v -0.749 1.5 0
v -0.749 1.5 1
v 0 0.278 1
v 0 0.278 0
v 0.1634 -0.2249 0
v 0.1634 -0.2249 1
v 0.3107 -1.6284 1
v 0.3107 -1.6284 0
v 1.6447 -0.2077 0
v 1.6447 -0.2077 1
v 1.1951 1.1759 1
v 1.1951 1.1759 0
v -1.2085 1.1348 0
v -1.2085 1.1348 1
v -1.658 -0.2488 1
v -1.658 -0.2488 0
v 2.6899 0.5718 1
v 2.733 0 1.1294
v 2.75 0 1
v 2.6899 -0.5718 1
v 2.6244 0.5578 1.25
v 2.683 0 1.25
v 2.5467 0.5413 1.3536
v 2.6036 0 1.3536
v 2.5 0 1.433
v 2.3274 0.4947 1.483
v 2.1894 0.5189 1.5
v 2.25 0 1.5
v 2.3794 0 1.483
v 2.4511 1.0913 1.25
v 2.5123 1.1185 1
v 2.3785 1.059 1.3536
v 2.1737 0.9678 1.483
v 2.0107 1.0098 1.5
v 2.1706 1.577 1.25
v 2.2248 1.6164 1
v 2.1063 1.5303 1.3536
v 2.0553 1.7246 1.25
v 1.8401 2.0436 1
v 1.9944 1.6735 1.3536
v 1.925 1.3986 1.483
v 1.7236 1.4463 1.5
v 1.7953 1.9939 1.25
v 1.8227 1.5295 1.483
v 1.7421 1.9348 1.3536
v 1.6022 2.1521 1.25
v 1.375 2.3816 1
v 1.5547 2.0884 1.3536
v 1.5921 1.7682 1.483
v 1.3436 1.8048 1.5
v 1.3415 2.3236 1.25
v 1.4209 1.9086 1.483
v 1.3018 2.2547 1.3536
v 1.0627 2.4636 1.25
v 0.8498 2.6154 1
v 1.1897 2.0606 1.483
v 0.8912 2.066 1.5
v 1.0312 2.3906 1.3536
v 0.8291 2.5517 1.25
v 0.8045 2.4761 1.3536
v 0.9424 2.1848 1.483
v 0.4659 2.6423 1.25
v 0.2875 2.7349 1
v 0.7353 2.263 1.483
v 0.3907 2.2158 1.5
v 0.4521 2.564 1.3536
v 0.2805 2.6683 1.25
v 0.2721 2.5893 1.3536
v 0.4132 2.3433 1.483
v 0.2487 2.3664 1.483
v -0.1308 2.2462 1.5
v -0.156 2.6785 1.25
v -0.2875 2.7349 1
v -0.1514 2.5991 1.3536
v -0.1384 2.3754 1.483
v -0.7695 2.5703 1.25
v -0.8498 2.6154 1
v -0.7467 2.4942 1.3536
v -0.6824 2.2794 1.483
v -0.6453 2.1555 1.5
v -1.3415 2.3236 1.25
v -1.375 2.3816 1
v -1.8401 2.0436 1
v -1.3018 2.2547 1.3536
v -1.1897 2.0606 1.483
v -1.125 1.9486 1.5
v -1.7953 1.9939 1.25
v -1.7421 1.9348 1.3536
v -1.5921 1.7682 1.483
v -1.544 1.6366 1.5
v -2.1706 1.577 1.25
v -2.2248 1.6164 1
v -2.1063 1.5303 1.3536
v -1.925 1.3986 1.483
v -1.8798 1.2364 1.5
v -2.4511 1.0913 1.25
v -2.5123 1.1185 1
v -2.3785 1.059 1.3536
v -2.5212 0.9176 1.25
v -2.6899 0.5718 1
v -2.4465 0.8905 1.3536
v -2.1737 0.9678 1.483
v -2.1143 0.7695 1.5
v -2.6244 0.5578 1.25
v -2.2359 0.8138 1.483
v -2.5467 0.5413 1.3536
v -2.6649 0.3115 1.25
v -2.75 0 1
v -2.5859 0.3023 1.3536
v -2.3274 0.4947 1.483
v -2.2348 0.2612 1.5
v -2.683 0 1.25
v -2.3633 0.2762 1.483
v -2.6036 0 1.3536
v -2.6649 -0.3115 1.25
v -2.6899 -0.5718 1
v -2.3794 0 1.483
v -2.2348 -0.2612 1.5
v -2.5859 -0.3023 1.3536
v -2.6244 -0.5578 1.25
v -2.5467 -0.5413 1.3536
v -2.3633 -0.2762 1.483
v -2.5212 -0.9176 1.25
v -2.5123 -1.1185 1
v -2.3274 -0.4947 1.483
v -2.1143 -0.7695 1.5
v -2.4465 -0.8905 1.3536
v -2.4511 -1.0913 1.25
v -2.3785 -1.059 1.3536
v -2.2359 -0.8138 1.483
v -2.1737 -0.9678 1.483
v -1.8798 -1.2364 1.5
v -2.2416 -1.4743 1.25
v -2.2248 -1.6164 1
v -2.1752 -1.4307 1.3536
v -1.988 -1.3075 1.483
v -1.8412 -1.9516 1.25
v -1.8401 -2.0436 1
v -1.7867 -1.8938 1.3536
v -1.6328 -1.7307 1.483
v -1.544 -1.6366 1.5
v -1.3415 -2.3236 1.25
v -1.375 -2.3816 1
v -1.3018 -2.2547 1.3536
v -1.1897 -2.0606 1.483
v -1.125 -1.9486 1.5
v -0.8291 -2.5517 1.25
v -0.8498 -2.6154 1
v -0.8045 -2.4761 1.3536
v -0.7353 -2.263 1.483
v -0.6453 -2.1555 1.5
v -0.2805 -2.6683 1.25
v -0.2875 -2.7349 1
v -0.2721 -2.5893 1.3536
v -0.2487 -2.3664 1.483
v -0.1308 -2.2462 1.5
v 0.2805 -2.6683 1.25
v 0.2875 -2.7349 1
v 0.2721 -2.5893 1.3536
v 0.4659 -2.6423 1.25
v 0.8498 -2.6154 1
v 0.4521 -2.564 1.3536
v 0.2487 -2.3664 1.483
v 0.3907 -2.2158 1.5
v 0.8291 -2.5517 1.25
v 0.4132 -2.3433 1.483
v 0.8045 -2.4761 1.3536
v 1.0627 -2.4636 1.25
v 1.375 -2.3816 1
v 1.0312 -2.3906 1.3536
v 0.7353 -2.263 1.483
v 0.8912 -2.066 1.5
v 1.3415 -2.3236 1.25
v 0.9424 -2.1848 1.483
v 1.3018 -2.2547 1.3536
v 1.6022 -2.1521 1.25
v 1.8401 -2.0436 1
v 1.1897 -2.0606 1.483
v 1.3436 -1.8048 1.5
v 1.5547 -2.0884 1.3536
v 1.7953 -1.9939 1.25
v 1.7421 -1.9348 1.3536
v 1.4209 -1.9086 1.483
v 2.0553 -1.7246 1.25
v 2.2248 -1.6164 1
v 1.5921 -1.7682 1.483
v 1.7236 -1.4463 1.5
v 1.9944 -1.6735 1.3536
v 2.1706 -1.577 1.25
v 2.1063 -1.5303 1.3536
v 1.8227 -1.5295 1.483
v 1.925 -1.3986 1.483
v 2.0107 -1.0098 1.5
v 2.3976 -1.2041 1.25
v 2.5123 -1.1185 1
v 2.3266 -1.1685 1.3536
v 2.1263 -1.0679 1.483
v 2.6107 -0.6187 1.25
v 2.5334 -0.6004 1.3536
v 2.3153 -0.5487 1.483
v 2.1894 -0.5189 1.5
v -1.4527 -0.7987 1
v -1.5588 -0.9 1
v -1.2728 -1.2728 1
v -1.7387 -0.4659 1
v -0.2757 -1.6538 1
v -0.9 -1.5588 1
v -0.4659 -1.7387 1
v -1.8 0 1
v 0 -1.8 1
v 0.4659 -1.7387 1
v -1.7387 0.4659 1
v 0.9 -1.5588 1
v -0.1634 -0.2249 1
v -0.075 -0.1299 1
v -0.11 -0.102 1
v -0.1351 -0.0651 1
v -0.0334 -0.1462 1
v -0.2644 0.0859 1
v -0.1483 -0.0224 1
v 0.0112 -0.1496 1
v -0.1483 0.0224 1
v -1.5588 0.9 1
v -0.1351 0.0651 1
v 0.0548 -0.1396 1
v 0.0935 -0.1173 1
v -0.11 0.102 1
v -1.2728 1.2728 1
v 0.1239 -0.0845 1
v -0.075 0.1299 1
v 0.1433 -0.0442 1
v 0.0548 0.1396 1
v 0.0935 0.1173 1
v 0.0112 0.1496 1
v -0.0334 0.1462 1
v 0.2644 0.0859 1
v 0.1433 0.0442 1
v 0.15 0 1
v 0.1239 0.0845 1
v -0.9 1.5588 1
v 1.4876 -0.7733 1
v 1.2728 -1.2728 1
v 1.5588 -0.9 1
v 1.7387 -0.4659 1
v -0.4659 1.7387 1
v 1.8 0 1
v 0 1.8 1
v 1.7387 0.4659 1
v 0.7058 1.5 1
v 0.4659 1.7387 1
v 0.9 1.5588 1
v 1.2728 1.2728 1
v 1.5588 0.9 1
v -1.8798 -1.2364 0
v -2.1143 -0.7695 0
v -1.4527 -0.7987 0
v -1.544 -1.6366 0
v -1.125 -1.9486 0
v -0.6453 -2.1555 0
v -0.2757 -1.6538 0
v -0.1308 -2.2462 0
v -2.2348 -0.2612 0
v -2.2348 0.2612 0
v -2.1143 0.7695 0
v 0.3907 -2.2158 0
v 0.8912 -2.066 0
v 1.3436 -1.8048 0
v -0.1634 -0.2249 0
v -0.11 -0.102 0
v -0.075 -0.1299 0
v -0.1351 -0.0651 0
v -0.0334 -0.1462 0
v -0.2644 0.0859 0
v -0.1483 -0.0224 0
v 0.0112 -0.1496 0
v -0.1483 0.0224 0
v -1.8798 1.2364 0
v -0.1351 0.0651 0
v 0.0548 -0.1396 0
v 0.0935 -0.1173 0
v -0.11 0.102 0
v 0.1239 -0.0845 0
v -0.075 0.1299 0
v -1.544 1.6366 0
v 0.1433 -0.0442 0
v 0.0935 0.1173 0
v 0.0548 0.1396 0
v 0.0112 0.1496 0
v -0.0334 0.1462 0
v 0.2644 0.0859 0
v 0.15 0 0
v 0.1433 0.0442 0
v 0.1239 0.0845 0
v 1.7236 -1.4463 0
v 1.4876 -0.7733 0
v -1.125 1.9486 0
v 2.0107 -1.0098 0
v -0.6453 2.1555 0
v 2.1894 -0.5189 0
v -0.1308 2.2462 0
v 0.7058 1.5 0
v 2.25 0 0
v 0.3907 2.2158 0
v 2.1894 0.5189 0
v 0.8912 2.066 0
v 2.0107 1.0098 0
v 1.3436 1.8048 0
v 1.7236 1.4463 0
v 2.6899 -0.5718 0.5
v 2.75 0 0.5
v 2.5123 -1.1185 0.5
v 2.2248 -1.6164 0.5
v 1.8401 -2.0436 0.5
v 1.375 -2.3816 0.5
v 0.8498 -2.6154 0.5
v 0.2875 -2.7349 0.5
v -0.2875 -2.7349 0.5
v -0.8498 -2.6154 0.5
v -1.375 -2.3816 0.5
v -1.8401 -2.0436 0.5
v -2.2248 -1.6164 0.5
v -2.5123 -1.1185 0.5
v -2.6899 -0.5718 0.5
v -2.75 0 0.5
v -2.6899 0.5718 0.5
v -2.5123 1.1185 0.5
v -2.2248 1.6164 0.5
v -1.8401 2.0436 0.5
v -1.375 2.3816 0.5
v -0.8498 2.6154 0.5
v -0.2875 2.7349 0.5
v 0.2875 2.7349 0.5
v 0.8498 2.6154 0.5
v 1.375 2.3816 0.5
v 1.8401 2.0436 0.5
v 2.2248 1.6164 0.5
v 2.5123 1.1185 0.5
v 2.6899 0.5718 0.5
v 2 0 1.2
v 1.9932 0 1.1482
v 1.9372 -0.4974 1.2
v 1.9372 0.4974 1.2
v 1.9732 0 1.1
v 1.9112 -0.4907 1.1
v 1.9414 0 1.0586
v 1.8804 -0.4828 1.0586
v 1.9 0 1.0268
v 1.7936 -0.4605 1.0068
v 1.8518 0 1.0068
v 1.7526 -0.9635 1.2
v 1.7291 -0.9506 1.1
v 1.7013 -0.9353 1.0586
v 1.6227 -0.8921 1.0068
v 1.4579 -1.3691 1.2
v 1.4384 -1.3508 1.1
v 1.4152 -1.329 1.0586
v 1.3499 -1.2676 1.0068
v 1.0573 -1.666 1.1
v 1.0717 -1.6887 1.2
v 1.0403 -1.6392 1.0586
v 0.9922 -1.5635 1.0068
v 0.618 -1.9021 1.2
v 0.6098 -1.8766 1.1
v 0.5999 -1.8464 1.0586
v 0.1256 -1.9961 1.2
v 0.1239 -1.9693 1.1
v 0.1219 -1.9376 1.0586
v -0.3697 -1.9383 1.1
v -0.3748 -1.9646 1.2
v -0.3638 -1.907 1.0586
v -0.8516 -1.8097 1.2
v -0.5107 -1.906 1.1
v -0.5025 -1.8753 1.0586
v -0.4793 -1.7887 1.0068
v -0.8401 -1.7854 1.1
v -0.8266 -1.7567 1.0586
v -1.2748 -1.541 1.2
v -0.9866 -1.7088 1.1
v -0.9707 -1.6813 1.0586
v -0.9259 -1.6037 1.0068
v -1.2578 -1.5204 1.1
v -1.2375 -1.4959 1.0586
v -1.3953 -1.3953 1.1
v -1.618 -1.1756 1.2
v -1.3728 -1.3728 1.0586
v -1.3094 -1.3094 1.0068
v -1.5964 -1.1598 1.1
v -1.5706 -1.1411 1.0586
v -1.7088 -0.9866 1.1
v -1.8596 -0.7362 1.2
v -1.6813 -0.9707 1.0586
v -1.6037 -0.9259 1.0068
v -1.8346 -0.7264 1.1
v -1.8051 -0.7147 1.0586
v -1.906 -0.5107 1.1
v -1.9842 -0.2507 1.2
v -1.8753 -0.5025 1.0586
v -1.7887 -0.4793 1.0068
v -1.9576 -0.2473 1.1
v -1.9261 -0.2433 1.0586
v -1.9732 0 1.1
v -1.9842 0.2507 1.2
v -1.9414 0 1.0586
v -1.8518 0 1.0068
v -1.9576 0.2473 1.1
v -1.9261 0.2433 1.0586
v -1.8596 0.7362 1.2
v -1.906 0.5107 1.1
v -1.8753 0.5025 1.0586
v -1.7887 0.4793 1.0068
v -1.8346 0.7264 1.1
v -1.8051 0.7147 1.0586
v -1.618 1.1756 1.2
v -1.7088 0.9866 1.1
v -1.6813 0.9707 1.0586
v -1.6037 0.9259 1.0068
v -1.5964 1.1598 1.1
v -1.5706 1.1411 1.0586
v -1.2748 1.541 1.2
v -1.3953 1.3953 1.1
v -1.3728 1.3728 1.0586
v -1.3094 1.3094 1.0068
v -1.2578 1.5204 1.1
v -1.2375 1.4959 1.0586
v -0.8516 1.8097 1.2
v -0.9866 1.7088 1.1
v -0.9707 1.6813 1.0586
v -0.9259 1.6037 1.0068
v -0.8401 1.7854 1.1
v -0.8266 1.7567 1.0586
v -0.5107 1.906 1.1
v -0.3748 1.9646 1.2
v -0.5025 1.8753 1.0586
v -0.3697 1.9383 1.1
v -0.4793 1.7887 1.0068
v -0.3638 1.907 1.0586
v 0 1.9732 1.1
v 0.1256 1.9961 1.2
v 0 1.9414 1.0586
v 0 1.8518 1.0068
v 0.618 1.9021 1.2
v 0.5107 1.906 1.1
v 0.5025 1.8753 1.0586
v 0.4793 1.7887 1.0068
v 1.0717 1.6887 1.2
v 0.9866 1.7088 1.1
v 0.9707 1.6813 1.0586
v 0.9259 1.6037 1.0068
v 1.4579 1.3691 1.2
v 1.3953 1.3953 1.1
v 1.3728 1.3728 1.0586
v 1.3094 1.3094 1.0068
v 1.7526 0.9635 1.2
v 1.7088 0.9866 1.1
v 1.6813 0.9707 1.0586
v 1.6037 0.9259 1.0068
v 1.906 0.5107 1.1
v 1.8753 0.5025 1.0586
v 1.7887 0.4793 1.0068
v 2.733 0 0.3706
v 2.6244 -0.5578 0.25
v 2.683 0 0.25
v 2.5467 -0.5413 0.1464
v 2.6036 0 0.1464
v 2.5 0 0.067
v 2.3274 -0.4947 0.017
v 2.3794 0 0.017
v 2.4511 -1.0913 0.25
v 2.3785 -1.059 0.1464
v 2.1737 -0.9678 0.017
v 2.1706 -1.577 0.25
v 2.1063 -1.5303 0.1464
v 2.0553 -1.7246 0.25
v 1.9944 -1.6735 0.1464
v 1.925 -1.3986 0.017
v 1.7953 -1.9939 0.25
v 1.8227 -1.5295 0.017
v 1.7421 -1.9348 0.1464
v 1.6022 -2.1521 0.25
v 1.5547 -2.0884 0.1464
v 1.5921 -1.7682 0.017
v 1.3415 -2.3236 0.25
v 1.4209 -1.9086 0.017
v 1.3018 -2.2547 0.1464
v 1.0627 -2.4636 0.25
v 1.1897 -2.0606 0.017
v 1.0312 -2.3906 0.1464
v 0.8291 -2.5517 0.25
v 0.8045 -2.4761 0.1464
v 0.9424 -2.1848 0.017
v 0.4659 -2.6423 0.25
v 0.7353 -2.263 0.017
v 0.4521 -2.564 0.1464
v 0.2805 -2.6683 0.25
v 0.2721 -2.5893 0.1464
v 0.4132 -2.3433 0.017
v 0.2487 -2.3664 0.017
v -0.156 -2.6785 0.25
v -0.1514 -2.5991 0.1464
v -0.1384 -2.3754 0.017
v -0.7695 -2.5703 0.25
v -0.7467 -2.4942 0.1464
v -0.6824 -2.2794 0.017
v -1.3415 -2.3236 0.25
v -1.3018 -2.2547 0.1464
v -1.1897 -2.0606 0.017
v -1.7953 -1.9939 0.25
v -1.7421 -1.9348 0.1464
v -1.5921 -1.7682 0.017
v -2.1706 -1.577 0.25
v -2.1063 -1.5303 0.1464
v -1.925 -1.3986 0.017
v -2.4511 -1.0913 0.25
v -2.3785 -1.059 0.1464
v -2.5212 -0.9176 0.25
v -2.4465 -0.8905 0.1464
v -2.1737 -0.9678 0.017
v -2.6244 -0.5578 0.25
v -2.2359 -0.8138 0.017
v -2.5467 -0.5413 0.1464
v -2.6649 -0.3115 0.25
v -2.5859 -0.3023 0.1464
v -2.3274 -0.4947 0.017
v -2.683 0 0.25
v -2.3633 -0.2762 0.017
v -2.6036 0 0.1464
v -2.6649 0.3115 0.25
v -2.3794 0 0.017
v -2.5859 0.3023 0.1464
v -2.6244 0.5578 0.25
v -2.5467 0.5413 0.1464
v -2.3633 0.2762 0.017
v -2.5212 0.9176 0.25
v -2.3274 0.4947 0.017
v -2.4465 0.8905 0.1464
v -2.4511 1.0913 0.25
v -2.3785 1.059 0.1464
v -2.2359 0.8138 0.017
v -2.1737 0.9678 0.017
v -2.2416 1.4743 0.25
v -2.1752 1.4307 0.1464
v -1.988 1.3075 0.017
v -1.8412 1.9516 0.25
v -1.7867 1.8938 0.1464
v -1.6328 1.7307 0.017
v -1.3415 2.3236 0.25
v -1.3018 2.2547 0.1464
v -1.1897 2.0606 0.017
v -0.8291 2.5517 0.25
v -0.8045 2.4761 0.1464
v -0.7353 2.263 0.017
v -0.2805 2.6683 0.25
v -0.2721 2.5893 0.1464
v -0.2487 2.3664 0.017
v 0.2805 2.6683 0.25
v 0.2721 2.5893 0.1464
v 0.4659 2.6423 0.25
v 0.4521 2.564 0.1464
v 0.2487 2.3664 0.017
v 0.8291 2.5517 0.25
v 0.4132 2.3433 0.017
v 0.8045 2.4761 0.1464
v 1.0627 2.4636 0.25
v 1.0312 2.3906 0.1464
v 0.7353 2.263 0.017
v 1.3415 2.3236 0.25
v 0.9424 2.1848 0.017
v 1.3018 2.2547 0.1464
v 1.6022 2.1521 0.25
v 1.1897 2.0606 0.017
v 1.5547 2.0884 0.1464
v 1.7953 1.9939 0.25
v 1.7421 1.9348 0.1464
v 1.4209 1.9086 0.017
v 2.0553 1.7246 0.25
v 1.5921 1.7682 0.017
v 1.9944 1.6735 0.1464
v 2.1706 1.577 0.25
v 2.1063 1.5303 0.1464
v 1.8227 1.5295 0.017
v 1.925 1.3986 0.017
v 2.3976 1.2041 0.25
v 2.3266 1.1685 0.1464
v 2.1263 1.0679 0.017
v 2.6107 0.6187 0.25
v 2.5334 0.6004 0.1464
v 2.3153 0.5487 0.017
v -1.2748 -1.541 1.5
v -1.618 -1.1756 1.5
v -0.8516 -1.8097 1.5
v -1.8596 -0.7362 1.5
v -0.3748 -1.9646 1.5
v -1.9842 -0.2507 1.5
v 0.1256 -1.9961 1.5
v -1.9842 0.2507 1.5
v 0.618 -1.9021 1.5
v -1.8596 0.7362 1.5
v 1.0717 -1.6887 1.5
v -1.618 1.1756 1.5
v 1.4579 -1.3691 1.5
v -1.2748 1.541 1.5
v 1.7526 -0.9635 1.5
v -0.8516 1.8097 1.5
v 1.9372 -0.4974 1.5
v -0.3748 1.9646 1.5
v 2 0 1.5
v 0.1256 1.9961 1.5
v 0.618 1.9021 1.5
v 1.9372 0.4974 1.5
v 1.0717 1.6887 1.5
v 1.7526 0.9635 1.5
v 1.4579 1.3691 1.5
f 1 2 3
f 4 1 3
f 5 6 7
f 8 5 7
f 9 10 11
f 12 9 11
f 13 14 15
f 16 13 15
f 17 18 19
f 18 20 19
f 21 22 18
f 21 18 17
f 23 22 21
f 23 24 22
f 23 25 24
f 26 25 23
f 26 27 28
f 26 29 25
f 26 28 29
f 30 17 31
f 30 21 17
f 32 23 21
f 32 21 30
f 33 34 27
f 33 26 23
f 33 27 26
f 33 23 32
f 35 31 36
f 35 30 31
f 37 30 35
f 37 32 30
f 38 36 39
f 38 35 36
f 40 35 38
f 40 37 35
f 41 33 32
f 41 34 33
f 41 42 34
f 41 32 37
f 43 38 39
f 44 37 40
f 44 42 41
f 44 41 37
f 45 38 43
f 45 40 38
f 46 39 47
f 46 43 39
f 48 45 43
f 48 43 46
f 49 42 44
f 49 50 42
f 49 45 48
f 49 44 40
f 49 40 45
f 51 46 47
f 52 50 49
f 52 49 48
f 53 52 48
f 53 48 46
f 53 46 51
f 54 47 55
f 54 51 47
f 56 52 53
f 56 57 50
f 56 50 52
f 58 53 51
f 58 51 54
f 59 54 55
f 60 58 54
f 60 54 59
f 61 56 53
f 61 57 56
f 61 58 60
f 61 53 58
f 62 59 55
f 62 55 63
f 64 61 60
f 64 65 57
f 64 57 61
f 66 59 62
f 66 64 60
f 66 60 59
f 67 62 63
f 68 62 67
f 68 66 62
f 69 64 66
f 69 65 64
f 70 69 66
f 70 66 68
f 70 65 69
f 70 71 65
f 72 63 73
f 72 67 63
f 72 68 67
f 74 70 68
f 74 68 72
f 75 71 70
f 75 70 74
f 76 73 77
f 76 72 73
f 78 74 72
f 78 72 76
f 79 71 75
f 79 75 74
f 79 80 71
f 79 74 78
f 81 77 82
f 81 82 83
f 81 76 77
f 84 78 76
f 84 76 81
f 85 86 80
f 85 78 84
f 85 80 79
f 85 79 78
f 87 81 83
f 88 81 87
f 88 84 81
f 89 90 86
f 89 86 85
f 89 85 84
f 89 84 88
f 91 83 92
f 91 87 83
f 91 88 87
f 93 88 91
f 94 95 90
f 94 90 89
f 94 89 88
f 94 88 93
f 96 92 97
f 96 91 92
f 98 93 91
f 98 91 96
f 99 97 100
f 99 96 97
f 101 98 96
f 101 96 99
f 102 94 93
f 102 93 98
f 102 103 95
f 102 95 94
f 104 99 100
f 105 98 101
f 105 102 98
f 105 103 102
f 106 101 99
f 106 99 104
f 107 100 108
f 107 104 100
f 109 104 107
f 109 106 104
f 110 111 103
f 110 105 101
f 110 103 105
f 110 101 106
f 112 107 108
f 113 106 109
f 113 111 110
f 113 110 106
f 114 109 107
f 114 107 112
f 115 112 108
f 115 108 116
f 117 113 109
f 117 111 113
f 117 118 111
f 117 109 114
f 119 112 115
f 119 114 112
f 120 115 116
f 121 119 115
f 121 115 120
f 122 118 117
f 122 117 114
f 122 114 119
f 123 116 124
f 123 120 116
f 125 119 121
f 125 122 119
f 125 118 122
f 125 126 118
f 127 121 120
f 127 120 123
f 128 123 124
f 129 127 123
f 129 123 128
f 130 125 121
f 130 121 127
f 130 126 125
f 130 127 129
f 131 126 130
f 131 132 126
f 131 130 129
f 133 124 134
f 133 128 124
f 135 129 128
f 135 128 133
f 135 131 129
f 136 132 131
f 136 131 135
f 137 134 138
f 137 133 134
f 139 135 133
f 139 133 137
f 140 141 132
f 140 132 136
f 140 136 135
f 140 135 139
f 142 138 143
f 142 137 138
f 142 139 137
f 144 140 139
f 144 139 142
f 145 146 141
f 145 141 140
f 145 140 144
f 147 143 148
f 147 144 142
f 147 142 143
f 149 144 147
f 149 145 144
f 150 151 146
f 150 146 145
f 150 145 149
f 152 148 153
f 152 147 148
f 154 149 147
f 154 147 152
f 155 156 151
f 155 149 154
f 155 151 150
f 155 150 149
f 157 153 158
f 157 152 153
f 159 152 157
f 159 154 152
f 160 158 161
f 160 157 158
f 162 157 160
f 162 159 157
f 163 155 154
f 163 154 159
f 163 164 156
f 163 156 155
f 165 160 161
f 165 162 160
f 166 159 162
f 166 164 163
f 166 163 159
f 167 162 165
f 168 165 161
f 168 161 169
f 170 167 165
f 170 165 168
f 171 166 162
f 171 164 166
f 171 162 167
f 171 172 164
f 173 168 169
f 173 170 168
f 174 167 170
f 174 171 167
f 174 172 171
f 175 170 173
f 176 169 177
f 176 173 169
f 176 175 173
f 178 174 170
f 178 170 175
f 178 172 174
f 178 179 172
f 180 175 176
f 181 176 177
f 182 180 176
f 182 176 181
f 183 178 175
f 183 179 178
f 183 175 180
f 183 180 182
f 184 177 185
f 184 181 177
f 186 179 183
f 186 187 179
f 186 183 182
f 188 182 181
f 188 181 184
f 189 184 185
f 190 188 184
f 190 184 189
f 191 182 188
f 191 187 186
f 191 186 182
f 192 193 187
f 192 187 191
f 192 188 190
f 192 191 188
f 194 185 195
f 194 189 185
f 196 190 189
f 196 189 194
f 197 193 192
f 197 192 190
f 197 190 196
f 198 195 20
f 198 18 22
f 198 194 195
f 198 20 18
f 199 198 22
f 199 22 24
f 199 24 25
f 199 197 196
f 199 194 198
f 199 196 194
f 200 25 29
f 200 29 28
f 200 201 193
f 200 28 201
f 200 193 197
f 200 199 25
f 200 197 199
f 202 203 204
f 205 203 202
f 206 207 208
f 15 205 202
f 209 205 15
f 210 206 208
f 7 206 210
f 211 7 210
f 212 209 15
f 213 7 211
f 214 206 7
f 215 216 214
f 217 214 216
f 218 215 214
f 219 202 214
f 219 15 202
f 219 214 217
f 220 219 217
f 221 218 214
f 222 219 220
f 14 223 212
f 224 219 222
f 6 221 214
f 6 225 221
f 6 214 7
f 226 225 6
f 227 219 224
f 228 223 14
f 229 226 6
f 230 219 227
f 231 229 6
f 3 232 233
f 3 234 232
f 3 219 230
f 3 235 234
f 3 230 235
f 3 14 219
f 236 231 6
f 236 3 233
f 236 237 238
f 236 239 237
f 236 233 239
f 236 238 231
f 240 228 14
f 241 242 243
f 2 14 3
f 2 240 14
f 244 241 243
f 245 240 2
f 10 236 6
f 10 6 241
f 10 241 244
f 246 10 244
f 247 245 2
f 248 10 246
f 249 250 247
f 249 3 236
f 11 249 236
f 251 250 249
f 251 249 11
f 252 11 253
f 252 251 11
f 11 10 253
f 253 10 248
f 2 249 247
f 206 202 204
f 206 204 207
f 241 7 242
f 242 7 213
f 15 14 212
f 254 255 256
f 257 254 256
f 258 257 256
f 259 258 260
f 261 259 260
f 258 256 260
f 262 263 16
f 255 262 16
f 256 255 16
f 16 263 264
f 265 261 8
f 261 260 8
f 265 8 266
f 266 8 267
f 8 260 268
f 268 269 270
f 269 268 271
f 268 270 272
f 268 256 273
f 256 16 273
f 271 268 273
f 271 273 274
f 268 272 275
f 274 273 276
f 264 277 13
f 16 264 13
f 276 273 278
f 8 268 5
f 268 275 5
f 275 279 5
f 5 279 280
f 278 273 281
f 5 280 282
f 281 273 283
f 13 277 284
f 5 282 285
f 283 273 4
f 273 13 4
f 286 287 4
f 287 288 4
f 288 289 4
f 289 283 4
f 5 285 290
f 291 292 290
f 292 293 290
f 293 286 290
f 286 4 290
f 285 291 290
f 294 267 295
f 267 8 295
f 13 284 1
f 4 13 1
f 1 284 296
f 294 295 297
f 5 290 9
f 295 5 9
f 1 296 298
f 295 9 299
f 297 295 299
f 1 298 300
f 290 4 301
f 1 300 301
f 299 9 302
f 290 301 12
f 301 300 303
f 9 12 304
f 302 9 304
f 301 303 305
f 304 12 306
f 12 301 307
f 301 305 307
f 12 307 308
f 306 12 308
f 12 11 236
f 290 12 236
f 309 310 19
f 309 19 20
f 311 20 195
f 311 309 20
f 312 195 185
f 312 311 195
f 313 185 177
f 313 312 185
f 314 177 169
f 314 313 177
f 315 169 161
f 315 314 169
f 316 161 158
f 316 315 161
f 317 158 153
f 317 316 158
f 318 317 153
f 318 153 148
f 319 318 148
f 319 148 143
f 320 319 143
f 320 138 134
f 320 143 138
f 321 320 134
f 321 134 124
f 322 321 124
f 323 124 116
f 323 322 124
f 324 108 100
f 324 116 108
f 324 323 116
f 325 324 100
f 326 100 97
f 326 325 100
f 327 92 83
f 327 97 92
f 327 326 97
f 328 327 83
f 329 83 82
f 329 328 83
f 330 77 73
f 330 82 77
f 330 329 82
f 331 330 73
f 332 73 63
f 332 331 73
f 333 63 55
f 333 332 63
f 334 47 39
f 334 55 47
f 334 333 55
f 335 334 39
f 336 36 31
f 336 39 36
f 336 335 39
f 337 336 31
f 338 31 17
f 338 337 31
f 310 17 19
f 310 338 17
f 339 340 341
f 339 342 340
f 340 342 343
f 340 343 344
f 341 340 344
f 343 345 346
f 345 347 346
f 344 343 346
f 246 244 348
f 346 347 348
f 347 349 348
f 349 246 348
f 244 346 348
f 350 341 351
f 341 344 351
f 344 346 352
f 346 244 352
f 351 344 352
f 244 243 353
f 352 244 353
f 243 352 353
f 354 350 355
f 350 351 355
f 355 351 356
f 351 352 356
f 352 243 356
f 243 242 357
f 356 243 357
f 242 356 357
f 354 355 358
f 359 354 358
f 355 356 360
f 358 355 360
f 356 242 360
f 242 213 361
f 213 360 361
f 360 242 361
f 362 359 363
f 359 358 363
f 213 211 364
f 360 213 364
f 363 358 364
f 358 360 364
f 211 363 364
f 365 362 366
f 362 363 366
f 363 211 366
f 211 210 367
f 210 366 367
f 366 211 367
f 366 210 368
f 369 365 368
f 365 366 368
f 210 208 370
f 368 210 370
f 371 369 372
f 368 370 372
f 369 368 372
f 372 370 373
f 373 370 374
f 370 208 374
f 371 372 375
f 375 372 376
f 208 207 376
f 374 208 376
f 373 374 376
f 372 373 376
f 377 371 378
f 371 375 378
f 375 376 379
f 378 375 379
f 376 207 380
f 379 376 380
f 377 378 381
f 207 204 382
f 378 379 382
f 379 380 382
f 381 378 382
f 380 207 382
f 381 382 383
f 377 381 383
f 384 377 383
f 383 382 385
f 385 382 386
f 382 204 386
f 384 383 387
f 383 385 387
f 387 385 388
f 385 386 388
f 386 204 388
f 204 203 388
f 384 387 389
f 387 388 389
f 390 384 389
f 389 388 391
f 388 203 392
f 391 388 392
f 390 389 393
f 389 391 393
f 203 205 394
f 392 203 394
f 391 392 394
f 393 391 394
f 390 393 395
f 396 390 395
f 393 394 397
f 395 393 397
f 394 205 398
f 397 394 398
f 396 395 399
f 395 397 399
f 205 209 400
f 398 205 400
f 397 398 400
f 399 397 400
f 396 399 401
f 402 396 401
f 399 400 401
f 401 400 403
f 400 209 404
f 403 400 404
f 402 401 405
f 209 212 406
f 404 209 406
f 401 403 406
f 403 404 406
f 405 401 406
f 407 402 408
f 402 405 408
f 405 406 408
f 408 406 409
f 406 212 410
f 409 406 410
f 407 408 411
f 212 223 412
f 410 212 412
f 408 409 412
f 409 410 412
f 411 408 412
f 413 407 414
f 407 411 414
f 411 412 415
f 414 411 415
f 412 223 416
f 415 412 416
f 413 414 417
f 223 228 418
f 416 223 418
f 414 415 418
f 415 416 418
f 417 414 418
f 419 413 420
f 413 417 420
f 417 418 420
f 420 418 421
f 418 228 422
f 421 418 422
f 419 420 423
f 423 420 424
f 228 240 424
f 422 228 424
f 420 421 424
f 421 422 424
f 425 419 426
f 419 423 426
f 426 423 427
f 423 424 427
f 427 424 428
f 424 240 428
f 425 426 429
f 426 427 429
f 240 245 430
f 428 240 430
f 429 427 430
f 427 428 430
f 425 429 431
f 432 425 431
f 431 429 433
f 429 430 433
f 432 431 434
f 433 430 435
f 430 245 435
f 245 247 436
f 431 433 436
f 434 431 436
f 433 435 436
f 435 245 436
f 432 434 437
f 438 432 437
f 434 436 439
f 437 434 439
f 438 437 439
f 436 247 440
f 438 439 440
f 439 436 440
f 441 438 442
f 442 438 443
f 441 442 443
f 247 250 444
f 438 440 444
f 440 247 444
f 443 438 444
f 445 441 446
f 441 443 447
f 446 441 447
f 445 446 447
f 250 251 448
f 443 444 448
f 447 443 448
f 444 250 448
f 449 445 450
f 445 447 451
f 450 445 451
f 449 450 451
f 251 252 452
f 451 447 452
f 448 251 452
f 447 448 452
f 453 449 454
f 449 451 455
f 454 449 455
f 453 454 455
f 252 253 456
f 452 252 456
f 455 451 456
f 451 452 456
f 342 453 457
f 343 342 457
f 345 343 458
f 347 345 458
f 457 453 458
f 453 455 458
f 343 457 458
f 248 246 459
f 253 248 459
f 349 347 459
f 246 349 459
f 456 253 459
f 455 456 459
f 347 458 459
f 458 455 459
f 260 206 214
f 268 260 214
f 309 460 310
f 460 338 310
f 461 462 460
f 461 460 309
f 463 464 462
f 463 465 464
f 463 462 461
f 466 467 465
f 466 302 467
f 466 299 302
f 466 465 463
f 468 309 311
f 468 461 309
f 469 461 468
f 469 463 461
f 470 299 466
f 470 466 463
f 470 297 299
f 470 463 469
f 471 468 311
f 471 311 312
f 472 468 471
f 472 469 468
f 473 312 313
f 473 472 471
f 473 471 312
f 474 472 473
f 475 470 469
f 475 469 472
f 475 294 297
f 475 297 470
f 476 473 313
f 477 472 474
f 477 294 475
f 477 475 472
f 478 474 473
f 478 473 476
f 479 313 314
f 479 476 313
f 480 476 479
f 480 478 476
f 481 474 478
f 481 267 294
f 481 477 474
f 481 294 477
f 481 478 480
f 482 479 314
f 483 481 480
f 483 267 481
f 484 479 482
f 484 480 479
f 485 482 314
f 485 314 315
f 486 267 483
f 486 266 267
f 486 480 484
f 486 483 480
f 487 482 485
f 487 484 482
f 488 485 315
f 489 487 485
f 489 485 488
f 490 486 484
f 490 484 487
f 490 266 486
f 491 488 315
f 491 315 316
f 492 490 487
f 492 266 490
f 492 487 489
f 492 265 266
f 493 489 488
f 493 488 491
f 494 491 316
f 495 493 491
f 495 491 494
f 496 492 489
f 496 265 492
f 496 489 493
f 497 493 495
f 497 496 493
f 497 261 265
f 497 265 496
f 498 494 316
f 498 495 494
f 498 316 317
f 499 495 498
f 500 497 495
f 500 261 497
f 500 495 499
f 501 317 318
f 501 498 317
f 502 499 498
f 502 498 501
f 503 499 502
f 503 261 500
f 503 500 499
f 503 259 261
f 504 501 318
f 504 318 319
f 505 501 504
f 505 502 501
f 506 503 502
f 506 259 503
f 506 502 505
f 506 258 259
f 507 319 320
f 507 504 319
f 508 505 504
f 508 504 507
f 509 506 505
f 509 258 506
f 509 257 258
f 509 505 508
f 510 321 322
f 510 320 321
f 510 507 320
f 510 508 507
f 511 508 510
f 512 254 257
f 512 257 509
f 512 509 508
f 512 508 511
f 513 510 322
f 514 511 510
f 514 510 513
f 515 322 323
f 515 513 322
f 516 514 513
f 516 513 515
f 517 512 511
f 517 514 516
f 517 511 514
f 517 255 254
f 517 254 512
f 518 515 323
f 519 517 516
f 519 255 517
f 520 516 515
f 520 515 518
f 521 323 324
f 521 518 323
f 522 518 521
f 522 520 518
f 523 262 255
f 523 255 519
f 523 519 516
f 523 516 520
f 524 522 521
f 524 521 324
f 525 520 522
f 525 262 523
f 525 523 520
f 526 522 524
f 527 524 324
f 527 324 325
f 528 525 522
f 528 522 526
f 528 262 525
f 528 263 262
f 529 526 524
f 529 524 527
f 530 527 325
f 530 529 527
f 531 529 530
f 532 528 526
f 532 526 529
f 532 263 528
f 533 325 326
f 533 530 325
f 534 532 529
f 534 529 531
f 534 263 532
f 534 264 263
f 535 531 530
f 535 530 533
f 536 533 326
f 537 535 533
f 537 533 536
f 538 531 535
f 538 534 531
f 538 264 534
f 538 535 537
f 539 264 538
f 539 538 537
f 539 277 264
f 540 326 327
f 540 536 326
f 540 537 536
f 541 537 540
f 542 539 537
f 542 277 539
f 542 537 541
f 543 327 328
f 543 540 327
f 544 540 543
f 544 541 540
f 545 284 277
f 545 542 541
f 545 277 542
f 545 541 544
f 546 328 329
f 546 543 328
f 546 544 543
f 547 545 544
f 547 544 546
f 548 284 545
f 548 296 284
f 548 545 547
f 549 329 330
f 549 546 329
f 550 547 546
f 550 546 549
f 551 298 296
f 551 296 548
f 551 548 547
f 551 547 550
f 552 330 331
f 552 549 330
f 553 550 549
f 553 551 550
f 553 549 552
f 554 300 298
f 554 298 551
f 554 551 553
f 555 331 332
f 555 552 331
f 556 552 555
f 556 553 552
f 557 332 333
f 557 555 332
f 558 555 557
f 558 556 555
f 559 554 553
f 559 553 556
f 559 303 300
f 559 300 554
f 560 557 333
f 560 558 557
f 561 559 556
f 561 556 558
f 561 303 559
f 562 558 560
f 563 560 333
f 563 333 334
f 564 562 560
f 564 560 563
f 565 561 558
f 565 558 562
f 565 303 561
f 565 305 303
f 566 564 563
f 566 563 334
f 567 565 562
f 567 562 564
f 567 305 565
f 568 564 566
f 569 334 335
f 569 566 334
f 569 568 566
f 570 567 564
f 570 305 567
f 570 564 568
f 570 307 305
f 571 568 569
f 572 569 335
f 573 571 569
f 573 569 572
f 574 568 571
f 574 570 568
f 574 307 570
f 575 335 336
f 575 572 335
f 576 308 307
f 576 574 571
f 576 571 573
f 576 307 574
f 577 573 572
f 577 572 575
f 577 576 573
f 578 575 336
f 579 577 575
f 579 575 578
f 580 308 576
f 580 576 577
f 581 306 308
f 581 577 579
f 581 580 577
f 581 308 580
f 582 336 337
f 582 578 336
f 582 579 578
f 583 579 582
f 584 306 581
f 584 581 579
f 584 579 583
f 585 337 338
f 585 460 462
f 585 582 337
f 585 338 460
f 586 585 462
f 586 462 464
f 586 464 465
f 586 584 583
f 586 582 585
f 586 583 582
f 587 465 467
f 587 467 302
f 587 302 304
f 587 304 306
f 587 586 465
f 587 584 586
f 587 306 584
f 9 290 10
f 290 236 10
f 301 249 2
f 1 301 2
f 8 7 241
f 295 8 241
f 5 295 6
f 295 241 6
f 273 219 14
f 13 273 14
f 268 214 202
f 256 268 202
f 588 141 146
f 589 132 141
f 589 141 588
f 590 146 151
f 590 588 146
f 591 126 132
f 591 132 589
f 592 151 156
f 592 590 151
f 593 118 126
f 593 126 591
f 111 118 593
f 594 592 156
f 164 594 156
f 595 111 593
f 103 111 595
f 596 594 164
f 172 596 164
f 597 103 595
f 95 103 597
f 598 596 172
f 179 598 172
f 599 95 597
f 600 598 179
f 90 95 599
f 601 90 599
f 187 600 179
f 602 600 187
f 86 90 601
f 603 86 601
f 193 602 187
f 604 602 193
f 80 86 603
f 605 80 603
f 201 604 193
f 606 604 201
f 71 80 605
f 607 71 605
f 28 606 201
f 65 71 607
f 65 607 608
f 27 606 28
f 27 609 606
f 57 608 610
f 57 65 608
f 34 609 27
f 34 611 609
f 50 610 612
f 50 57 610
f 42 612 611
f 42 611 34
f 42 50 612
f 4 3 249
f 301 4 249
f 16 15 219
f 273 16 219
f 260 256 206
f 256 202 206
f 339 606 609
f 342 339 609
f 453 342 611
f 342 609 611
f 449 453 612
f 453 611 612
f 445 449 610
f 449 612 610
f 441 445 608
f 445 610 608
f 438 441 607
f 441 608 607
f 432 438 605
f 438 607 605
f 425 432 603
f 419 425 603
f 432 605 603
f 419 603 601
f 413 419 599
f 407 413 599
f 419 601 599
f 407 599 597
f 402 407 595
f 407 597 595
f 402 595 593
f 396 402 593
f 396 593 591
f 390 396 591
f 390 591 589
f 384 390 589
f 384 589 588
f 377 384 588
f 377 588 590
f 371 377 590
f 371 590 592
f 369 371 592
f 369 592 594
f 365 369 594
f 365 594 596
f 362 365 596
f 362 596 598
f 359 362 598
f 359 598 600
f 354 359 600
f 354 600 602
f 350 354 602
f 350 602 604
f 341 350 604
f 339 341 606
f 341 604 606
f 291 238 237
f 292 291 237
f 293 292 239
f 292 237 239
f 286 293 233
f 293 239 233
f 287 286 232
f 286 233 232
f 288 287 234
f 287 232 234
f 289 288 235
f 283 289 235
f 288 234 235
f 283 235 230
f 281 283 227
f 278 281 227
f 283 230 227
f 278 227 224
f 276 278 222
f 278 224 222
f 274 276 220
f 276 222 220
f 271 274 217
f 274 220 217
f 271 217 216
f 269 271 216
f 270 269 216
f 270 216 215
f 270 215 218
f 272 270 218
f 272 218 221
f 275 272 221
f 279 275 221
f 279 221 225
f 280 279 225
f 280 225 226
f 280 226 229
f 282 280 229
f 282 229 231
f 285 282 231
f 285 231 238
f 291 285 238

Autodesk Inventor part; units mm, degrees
ref_plane "YZ Plane" through (0, 0, 0) normal (1, 0, 0) x (0, 1, 0)
ref_plane "XZ Plane" through (0, 0, 0) normal (0, 1, 0) x (-1, 0, 0)
ref_plane "XY Plane" through (0, 0, 0) normal (0, 0, 1) x (1, 0, 0)
sketch "Sketch1" plane through (0, 0, 0) normal (0, 0, 1) x (1, 0, 0)
  circle A0 centre (0, 0) radius 2.75
  circle A1 centre (0, 0) radius 2
  dimension "d0" = 5.5
  dimension "d1" = 4
extrude "Extrusion1" add sketch "Sketch1" along normal blind 1.5 contours A0 | A1
sketch "Sketch2" plane through (0, 0, 1.5) normal (0, 0, 1) x (1, 0, 0)
  circle A0 centre (0, 0) radius 2
  dimension "d4" = 4
extrude "Extrusion2" cut sketch "Sketch2" against normal blind 0.5
fillet "Fillet1" radius 0.5 2 edges at (-2.75, 0, 1.5) (-2.75, 0, 0)
fillet "Fillet2" radius 0.2 1 edges at (-2, 0, 1)
sketch "Sketch3" plane through (0, 0, 1) normal (0, 0, 1) x (1, 0, 0)
  point P0 (0, 0)
sketch "Sketch4" plane through (0, 0, 1) normal (0, 0, 1) x (1, 0, 0)
  line L0 (-0.749, 1.5) -> (0, 0.278)
  line L1 (0, 0.278) -> (0.7058, 1.5)
  line L2 (0.7058, 1.5) -> (-0.749, 1.5)
  circle A0 centre (0, 0) radius 2 projected
  dimension "d9" = 0.5
extrude "Extrusion3" cut sketch "Sketch4" against normal through all contours L2 L1 L0
pattern_circular "Circular Pattern1" count 5 over 360 about axis through (0, 0, 1.2) along (0, 0, -1) of "Extrusion3"
sketch "Sketch5" plane through (0, 0, 1) normal (0, 0, 1) x (1, 0, 0)
  circle A0 centre (0, 0) radius 0.15
  dimension "d15" = 0.3
extrude "Extrusion4" cut sketch "Sketch5" against normal through all
properties part number "Wheel 2" material "Rubber"
